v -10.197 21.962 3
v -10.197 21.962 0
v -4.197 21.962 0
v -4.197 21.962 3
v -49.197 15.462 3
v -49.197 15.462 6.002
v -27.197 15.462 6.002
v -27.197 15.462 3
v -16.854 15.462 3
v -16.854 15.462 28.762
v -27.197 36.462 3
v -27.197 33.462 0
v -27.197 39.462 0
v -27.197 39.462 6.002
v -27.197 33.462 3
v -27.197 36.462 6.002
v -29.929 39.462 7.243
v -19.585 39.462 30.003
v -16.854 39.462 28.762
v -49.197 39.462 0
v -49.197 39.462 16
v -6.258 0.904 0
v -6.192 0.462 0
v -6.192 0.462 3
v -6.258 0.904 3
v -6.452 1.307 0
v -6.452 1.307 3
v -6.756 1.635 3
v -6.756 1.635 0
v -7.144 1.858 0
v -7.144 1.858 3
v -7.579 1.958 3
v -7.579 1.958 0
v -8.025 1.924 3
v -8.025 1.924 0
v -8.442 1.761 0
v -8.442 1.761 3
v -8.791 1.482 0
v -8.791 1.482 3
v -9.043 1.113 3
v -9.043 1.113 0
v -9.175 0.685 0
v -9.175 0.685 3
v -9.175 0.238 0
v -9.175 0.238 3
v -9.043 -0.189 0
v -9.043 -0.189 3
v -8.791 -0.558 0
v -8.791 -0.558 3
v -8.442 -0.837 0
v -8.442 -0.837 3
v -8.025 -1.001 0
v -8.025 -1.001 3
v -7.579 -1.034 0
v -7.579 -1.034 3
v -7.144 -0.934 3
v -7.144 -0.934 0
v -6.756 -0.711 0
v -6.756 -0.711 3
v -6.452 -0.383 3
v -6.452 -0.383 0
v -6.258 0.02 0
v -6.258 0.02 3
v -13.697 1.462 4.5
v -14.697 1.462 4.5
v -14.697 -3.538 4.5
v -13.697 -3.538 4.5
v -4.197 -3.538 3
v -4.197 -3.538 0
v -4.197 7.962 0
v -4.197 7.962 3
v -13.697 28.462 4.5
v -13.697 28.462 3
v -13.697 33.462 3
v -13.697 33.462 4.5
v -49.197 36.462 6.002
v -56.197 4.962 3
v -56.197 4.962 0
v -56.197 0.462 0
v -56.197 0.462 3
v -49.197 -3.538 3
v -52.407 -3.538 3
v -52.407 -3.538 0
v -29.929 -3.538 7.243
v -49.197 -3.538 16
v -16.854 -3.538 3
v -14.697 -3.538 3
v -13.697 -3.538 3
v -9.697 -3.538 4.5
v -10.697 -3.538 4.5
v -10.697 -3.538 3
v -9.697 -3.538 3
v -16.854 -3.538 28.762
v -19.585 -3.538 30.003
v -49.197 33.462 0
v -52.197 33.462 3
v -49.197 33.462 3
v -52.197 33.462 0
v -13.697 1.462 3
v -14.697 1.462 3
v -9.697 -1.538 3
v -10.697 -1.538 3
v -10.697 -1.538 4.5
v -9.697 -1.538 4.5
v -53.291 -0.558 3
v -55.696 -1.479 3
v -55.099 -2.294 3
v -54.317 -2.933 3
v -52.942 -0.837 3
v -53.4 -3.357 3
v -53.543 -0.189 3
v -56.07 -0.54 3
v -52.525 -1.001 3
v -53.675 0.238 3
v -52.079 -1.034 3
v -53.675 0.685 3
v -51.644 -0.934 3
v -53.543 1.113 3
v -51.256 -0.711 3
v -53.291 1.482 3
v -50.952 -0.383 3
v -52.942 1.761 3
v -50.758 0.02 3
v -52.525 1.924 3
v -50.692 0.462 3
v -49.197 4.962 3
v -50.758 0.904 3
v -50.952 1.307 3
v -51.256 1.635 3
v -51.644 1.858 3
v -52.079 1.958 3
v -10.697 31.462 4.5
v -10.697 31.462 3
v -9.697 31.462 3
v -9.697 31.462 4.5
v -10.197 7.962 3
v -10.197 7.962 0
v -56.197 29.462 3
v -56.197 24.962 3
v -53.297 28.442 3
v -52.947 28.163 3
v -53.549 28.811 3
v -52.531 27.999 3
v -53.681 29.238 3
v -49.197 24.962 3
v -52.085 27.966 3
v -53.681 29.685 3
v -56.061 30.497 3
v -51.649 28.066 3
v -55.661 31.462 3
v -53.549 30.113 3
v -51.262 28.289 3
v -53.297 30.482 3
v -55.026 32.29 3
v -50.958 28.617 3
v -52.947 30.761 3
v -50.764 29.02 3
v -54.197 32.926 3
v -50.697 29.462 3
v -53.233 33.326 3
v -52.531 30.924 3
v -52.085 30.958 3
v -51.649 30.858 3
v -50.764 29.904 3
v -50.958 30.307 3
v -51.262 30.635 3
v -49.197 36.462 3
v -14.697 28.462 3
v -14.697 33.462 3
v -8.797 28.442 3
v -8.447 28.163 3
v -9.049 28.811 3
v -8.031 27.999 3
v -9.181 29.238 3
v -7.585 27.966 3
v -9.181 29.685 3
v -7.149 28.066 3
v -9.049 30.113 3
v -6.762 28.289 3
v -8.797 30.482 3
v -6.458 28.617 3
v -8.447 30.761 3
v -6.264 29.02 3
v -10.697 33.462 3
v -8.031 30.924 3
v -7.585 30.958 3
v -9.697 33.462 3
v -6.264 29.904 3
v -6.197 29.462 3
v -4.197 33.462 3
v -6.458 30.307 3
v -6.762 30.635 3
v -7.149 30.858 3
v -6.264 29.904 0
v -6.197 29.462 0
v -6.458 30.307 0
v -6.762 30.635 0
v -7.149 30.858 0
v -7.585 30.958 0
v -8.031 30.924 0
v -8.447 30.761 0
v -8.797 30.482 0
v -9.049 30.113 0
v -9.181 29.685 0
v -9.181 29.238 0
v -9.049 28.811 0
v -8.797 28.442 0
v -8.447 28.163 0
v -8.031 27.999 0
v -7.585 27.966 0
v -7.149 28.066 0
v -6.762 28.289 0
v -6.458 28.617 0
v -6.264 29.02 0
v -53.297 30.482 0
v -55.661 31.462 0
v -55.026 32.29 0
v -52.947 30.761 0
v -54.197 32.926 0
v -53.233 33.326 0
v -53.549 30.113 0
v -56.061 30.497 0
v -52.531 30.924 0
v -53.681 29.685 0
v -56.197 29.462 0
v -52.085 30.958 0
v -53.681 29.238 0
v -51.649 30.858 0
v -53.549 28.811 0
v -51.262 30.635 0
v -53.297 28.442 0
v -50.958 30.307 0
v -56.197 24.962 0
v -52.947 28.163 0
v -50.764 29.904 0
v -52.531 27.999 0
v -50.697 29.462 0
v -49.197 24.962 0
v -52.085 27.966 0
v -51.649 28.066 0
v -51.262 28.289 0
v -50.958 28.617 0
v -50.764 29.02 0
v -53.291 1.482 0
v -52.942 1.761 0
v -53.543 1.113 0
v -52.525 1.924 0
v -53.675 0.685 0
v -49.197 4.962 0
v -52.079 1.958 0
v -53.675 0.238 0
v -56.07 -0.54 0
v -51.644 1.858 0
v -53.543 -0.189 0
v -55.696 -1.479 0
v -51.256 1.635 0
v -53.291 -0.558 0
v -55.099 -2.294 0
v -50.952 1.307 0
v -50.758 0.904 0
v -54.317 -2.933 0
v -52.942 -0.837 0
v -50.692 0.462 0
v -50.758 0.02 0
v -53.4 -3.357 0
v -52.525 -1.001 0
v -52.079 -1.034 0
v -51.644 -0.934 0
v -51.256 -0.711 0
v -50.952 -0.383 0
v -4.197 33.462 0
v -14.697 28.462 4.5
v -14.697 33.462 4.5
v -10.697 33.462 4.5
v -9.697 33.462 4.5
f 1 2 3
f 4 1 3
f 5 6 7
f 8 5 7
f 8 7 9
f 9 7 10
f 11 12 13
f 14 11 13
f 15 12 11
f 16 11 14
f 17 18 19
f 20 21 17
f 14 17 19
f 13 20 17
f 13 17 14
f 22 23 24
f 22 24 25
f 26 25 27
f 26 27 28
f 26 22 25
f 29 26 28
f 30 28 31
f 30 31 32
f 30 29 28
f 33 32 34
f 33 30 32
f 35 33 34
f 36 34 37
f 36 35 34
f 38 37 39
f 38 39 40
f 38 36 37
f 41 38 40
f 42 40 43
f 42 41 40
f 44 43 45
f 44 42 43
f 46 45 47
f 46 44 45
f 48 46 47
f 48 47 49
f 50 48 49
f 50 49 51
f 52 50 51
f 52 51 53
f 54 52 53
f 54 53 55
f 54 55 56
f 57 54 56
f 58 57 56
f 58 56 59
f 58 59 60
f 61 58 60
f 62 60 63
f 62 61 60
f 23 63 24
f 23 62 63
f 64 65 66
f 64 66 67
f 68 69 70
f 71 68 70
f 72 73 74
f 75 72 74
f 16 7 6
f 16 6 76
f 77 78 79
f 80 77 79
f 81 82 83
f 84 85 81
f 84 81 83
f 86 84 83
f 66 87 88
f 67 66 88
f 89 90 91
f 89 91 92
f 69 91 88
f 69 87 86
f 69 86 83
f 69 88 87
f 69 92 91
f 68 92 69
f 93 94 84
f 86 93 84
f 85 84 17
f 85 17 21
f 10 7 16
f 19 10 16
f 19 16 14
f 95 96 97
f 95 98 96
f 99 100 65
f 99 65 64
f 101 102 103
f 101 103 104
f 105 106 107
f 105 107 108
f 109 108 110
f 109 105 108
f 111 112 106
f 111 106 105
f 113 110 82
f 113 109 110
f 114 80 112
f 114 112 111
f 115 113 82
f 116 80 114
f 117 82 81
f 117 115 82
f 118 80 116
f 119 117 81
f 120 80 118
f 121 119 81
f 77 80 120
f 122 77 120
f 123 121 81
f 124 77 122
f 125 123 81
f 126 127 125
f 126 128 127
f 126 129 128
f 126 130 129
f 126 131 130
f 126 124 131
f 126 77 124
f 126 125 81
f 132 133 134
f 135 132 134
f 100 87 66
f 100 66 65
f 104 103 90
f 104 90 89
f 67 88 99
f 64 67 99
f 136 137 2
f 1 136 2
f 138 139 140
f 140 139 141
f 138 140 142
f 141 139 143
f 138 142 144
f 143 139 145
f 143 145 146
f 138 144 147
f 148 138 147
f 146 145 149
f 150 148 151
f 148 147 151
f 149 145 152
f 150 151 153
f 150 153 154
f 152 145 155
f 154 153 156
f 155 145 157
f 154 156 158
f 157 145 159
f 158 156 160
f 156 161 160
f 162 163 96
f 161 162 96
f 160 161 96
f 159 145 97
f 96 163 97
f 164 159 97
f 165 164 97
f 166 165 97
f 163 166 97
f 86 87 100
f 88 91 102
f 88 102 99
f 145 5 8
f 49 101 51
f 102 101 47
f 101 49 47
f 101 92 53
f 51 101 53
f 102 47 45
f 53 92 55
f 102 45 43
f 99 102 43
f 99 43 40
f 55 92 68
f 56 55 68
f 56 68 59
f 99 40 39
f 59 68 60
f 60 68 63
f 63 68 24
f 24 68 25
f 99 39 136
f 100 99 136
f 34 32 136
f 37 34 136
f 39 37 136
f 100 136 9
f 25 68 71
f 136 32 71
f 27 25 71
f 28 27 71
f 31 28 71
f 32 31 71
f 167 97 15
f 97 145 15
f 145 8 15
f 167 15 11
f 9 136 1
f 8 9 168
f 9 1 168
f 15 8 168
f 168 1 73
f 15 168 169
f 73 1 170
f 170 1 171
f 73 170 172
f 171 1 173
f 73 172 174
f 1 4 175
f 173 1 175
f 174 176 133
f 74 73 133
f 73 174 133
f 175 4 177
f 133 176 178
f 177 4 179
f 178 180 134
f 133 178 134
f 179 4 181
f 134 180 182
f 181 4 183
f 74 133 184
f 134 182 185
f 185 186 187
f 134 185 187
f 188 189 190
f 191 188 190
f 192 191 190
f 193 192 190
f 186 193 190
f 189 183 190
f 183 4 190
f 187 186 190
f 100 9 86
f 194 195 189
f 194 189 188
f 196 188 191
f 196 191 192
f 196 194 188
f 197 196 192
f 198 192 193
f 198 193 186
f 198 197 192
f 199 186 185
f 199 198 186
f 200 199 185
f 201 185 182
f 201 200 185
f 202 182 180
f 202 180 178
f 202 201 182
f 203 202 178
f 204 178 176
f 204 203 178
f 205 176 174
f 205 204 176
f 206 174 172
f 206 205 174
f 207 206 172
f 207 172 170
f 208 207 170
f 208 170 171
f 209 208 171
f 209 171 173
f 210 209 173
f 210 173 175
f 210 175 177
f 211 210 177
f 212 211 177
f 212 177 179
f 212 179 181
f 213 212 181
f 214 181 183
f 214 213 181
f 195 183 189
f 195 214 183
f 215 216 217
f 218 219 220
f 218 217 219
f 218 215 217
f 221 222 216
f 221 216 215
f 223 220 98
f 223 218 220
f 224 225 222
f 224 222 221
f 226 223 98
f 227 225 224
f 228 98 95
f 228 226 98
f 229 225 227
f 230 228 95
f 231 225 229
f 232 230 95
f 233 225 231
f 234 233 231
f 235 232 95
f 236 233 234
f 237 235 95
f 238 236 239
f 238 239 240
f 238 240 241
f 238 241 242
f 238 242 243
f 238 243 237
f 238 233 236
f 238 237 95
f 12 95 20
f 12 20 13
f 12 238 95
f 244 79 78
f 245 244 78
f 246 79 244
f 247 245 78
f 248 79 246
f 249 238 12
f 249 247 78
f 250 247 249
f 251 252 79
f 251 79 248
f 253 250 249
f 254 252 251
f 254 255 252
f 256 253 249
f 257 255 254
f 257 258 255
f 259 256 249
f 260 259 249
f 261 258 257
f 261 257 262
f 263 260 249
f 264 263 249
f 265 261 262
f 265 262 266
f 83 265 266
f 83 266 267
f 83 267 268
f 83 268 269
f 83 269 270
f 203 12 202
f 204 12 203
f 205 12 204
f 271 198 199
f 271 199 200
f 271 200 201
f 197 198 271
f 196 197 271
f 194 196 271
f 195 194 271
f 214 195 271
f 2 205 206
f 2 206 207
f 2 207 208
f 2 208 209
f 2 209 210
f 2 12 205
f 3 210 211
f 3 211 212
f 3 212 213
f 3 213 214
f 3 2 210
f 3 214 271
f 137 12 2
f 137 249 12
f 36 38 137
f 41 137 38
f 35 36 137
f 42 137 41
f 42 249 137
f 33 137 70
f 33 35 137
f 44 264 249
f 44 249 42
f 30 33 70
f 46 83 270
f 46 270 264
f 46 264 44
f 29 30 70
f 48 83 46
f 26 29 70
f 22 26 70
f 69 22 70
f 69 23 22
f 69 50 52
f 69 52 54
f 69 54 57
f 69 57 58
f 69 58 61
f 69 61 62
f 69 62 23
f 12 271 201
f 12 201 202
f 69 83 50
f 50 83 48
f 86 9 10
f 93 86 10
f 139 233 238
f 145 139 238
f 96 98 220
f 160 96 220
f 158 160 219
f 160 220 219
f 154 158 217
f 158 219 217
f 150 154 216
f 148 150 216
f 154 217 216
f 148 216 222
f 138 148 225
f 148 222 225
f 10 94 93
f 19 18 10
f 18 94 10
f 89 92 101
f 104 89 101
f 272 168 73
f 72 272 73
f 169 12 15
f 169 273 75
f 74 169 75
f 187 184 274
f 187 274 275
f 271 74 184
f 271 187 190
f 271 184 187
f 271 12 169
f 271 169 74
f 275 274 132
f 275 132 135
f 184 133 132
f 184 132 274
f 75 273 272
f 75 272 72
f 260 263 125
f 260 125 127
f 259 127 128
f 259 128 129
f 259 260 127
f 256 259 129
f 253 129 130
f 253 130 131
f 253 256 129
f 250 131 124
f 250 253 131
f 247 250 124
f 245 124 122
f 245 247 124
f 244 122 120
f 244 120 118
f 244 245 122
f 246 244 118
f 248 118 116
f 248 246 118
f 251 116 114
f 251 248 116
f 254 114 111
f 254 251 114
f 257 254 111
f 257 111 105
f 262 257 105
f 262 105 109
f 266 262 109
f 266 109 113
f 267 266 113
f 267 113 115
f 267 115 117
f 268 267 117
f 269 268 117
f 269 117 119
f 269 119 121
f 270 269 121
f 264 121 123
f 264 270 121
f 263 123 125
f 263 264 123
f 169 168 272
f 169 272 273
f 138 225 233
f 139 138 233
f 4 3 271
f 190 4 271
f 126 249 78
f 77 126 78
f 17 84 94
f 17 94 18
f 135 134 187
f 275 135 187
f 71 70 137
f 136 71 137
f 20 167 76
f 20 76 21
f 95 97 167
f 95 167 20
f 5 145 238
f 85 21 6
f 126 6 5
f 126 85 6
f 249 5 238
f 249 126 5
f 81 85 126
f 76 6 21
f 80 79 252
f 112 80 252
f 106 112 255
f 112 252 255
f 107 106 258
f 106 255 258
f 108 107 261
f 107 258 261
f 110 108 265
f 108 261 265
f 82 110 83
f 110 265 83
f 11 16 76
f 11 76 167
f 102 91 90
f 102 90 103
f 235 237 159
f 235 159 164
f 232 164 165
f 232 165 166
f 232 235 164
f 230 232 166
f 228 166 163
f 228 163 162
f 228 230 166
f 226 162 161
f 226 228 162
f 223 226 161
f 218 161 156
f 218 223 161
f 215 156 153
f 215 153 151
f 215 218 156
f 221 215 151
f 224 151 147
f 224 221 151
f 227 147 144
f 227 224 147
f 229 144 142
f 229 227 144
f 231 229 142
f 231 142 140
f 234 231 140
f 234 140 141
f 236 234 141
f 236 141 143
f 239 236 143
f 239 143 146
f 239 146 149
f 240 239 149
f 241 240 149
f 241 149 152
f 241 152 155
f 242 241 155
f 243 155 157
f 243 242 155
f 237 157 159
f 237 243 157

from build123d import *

# Parameters (mm, degrees)
CROQUIS1_R              = 1.5
SALIENTE_EXTRUIR1_DEPTH = 3
CROQUIS3_W              = 22
CROQUIS3_H              = 37
SALIENTE_EXTRUIR2_DEPTH = 13
CORTAR_EXTRUIR1_START   = -37
CORTAR_EXTRUIR1_DEPTH   = 37
SALIENTE_EXTRUIR4_DEPTH = 6
CROQUIS7_W              = 3.002058729
CROQUIS7_H              = 21
CORTAR_EXTRUIR2_DEPTH   = 22
CROQUIS8_W              = 3
CROQUIS8_H              = 43
SALIENTE_EXTRUIR5_DEPTH = 25
SALIENTE_EXTRUIR6_START = -19
SALIENTE_EXTRUIR6_DEPTH = 19
CROQUIS13_W             = 1
CROQUIS13_H             = 2
CROQUIS13_H_2           = 5
SALIENTE_EXTRUIR8_DEPTH = 1.5


with BuildPart() as part:
    # Croquis1 → Saliente-Extruir1 (new body)
    with BuildSketch(Plane.XY):
        with BuildLine():
            Line((-4.197309417, 33.461883408), (-52.197309417, 33.461883408))
            ThreePointArc((-52.197309417, 33.461883408), (-55.025736542, 32.290310533), (-56.197309417, 29.461883408))
            Line((-56.197309417, 29.461883408), (-56.197309417, 24.961883408))
            Line((-56.197309417, 24.961883408), (-49.197309417, 24.961883408))
            Line((-49.197309417, 24.961883408), (-49.197309417, 4.961883408))
            Line((-49.197309417, 4.961883408), (-56.197309417, 4.961883408))
            Line((-56.197309417, 4.961883408), (-56.197309417, 0.461883408))
            ThreePointArc((-56.197309417, 0.461883408), (-55.099110766, -2.293519818), (-52.406664651, -3.538116592))
            Line((-52.406664651, -3.538116592), (-4.197309417, -3.538116592))
            Line((-4.197309417, -3.538116592), (-4.197309417, 7.961883408))
            Line((-4.197309417, 7.961883408), (-10.197309417, 7.961883408))
            Line((-10.197309417, 7.961883408), (-10.197309417, 21.961883408))
            Line((-10.197309417, 21.961883408), (-4.197309417, 21.961883408))
            Line((-4.197309417, 21.961883408), (-4.197309417, 33.461883408))
        make_face()
        with Locations((-52.19152813, 0.461883408)):
            Circle(CROQUIS1_R, mode=Mode.SUBTRACT)
        with Locations((-7.69152813, 0.461883408)):
            Circle(CROQUIS1_R, mode=Mode.SUBTRACT)
        with Locations((-52.197309417, 29.461883408)):
            Circle(CROQUIS1_R, mode=Mode.SUBTRACT)
        with Locations((-7.697309417, 29.461882832)):
            Circle(CROQUIS1_R, mode=Mode.SUBTRACT)
    extrude(amount=SALIENTE_EXTRUIR1_DEPTH)

    # Croquis3 → Saliente-Extruir2 (add)
    with BuildSketch(Plane.XY.offset(3)):
        with Locations((-38.197309417, 14.961883408)):
            Rectangle(CROQUIS3_W, CROQUIS3_H)
    extrude(amount=SALIENTE_EXTRUIR2_DEPTH)

    # Croquis4 → Cortar-Extruir1 (cut)
    with BuildSketch(Plane.XZ.offset(3.538116592).offset(CORTAR_EXTRUIR1_START)):
        Polygon((-27.197309417, 16), (-27.197309417, 6.002058729), (-49.197309417, 16), align=None)
    extrude(amount=CORTAR_EXTRUIR1_DEPTH, mode=Mode.SUBTRACT)

    # Croquis6 → Saliente-Extruir4 (add)
    with BuildSketch(Plane(origin=(0, 33.461883408, 0), x_dir=(1, 0, 0), z_dir=(0, 1, 0))):
        Polygon((-27.197309417, -6.002058729), (-49.197309417, -16), (-49.197309417, 0), (-27.197309417, 0), align=None)
    extrude(amount=SALIENTE_EXTRUIR4_DEPTH)

    # Croquis7 → Cortar-Extruir2 (cut)
    with BuildSketch(Plane(origin=(-27.197309417, 0, 0), x_dir=(0, 0, -1), z_dir=(1, 0, 0))):
        with Locations((-4.501029365, 25.961883408)):
            Rectangle(CROQUIS7_W, CROQUIS7_H)
    extrude(amount=-CORTAR_EXTRUIR2_DEPTH, mode=Mode.SUBTRACT)

    # Croquis8 → Saliente-Extruir5 (add)
    with BuildSketch(Plane(origin=(-2.394740987, 0, -5.269515022), x_dir=(0.9103985682863143, 0, -0.4137323372208525), z_dir=(0.4137323372208525, 0, 0.9103985682863143))):
        with Locations((-28.743637341, 17.961883408)):
            Rectangle(CROQUIS8_W, CROQUIS8_H)
    extrude(amount=SALIENTE_EXTRUIR5_DEPTH)

    # Croquis9 → Saliente-Extruir6 (add)
    with BuildSketch(Plane.XZ.offset(3.538116592).offset(SALIENTE_EXTRUIR6_START)):
        Polygon((-16.854000987, 28.762022936), (-27.197309417, 6.002058729), (-27.197309417, 3), (-16.854000987, 3), align=None)
    extrude(amount=SALIENTE_EXTRUIR6_DEPTH)

    # Croquis13 → Saliente-Extruir8 (add)
    with BuildSketch(Plane.XY.offset(3)):
        with Locations((-10.197309417, -2.538116592)):
            Rectangle(CROQUIS13_W, CROQUIS13_H)
        with Locations((-10.197309417, 32.461883408)):
            Rectangle(CROQUIS13_W, CROQUIS13_H)
        with Locations((-14.197309417, 30.961883408)):
            Rectangle(CROQUIS13_W, CROQUIS13_H_2)
        with Locations((-14.197309417, -1.038116592)):
            Rectangle(CROQUIS13_W, CROQUIS13_H_2)
    extrude(amount=SALIENTE_EXTRUIR8_DEPTH)


solid = part.part
